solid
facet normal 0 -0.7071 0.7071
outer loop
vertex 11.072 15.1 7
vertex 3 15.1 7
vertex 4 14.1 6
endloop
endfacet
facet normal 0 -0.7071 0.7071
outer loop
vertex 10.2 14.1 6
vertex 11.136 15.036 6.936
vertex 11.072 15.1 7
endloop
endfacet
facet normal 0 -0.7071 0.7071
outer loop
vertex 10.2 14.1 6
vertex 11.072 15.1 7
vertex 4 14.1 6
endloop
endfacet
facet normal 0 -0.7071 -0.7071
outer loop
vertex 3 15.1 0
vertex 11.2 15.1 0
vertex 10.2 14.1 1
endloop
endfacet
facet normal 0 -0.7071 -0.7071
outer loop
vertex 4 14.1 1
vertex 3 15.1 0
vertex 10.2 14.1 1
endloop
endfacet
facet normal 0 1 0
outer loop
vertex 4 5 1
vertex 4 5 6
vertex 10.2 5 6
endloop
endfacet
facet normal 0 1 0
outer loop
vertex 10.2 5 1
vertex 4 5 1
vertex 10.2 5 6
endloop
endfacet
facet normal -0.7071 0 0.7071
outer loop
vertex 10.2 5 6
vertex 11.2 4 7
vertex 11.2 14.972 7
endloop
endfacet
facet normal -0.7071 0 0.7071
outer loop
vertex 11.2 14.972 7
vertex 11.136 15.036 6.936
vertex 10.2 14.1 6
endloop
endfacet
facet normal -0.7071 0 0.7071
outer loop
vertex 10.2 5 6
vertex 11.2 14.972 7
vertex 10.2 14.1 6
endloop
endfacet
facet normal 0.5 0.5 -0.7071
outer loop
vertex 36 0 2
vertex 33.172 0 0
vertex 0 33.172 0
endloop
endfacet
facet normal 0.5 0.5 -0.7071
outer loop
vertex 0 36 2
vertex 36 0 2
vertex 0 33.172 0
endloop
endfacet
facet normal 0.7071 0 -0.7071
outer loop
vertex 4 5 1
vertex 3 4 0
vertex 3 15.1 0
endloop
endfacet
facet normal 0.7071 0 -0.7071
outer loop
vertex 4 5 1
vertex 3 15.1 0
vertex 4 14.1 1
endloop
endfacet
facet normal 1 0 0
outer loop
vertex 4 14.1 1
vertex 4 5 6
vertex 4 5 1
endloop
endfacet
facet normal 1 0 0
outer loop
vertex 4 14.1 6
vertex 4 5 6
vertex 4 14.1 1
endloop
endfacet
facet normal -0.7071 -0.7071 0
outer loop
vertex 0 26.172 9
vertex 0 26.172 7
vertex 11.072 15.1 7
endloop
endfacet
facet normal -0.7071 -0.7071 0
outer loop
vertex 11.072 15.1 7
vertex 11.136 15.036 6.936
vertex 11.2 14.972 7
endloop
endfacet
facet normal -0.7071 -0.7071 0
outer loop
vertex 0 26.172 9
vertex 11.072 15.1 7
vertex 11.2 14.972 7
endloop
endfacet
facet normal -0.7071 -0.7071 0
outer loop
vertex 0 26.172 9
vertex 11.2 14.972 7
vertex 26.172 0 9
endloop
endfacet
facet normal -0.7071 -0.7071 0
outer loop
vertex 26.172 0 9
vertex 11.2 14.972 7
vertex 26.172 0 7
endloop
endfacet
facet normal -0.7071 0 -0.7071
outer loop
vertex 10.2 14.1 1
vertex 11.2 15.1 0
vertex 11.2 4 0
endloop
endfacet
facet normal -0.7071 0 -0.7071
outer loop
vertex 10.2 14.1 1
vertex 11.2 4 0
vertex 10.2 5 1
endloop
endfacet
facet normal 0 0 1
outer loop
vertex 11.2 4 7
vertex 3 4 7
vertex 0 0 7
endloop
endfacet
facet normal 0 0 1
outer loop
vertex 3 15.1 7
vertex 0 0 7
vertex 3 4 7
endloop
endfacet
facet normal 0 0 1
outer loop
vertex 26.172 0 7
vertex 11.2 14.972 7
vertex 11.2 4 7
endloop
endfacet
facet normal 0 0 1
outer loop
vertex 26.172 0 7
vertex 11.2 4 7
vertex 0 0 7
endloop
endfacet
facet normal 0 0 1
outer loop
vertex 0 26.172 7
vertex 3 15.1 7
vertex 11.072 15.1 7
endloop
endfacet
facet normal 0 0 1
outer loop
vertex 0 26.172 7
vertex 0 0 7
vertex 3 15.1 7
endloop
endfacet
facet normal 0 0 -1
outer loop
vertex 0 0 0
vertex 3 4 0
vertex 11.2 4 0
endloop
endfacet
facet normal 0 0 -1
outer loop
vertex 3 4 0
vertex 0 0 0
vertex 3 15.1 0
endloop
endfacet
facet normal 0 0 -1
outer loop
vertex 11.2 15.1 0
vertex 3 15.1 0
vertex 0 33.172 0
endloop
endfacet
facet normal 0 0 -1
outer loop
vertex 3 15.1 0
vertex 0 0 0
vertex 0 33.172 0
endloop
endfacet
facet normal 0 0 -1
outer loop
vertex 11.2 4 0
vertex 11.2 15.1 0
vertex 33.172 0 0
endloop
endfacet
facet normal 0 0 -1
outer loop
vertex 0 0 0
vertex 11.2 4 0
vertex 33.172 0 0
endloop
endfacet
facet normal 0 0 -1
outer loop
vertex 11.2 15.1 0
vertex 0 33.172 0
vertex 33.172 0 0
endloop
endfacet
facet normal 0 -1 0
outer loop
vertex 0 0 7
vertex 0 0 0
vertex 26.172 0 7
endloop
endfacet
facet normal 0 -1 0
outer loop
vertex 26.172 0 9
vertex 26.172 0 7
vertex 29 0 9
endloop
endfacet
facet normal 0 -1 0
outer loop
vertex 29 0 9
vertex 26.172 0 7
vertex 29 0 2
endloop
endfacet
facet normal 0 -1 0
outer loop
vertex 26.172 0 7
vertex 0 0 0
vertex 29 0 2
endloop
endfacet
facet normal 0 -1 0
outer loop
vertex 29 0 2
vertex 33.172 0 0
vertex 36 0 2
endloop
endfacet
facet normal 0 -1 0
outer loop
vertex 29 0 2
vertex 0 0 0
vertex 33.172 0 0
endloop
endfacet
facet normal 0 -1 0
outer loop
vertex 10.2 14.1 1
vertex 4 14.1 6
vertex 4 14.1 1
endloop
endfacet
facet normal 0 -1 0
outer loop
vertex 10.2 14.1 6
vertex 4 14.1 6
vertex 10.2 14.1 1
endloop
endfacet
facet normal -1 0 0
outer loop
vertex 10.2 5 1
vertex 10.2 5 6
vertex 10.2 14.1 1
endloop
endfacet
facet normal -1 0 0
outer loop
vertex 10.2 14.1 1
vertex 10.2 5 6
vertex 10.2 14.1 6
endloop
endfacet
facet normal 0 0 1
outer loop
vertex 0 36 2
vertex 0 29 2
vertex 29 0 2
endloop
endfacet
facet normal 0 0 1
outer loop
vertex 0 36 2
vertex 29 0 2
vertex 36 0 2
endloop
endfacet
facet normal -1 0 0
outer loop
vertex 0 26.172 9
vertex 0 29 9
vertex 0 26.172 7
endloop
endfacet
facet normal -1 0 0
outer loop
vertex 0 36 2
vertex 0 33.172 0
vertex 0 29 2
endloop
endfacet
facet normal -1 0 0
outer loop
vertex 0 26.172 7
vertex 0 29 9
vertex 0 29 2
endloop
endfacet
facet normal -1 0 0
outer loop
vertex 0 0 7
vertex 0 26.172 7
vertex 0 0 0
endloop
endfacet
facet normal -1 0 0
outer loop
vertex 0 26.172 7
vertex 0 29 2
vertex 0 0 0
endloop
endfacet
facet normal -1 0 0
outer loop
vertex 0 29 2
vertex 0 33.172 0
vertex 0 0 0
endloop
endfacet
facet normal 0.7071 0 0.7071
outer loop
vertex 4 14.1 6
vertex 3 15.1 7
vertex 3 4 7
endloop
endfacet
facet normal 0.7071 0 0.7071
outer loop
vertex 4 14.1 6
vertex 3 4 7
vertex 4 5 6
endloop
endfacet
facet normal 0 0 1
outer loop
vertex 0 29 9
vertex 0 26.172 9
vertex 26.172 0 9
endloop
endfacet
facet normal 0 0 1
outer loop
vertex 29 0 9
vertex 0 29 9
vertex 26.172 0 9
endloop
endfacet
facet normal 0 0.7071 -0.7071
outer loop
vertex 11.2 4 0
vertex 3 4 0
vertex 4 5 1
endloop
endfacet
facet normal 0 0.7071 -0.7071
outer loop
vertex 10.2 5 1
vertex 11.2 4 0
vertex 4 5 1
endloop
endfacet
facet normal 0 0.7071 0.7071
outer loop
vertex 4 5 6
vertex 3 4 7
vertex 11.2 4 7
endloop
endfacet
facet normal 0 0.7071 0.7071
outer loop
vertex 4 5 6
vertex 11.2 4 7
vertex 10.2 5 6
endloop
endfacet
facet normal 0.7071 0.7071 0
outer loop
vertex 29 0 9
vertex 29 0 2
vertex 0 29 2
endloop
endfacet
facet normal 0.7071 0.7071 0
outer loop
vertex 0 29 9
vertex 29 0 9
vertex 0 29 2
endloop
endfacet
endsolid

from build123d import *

# Parameters (mm, degrees)
F1_DEPTH     = 2
F3_DEPTH     = 5
F5_DEPTH     = 2
F6_W         = 6.2
F6_H         = 9.1
F7_DEPTH     = 7.001
F8_T1_DEPTH  = 9.1
F8_T3_DEPTH  = 6.2
F8_T9_DEPTH  = 8.771682988
F8_T13_DEPTH = 11.671682988
F8_T20_DEPTH = 11.671682988
F8_T24_DEPTH = 8.771682988
F8_T31_DEPTH = 8.771682988
F8_T36_DEPTH = 11.671682988
F8_T44_DEPTH = 8.771682988
F8_T48_DEPTH = 11.671682988
F8_T55_DEPTH = 8.771682988
F8_T59_DEPTH = 11.671682988
F8_T66_DEPTH = 8.771682988
F8_T70_DEPTH = 11.671682988
F8_T77_DEPTH = 8.771682988
F8_T81_DEPTH = 11.671682988
F8_T88_DEPTH = 11.671682988
F8_T92_DEPTH = 8.771682988
F9_SIZE      = 1.99999


# Not quite as in the source:
# - a fillet or chamfer that OpenCascade refuses, or shapes differently, is made with other operations: its cross-section is extruded or revolved along the edge and cut away or added
# - a fillet or chamfer is up to 0.001 mm smaller than in the source, because OpenCascade refuses the exact size


with BuildPart() as f1:
    # F0 (on Top) → F1 (new body)
    with BuildSketch(Plane.XY):
        Polygon((0, 36), (0, 0), (36, 0), align=None)
    extrude(amount=F1_DEPTH)

    # F2 (on face) → F3 (join)
    with BuildSketch(Plane.XY.offset(2)):
        Polygon((0, 29), (0, 0), (29, 0), align=None)
    extrude(amount=F3_DEPTH)

    # F4 (on face) → F5 (join)
    with BuildSketch(Plane.XY.offset(7)):
        Polygon((29, 0), (0, 29), (0, 26.1715728753), (26.1715728753, 0), align=None)
    extrude(amount=F5_DEPTH)

    # F6 (on face) → F7 (cut, through all)
    with BuildSketch(Plane.XY.offset(7)):
        with Locations((7.1, 9.55)):
            Rectangle(F6_W, F6_H)
    extrude(amount=-F7_DEPTH, mode=Mode.SUBTRACT)

    # F8: chamfer of 1 on 8 edges, made by hand

    # F8_s2 → F8_t1 (cut)
    with BuildSketch(Plane.XZ.offset(-14.1)):
        Polygon((3, 7), (4, 6), (4, 7), align=None)
        Polygon((11.2, 7), (10.2, 6), (10.2, 7), align=None)
        Polygon((11.2, 0), (10.2, 1), (10.2, 0), align=None)
        Polygon((3, 0), (4, 1), (4, 0), align=None)
    extrude(amount=F8_T1_DEPTH, mode=Mode.SUBTRACT)

    # F8_s4 → F8_t3 (cut)
    with BuildSketch(Plane.YZ.offset(4)):
        Polygon((15.1, 7), (14.1, 6), (14.1, 7), align=None)
        Polygon((4, 7), (5, 6), (5, 7), align=None)
        Polygon((15.1, 0), (14.1, 1), (14.1, 0), align=None)
        Polygon((4, 0), (5, 1), (5, 0), align=None)
    extrude(amount=F8_T3_DEPTH, mode=Mode.SUBTRACT)


with BuildPart() as f8_tool7:
    # F8_s8 → F8_t9 (new body)
    with BuildSketch(Plane.YZ.offset(10.2)):
        Polygon((15.1, 7), (14.1, 6), (14.1, 7), align=None)
    extrude(amount=-F8_T9_DEPTH)

    split(bisect_by=Plane.YZ.offset(4), keep=Keep.BOTTOM)


with BuildPart() as f8_tool11:
    # F8_s12 → F8_t13 (new body)
    with BuildSketch(Plane.XZ.offset(-16.671682988)):
        Polygon((3, 7), (4, 6), (4, 7), align=None)
    extrude(amount=F8_T13_DEPTH)

    split(bisect_by=Plane.XZ.offset(-14.1), keep=Keep.BOTTOM)


with BuildPart() as f8_tool7_1:
    add(f8_tool7.part)

    # F8_t15: intersect F8_tool11
    add(f8_tool11.part, mode=Mode.INTERSECT)


with BuildPart() as f1_1:
    add(f1.part)

    # F8_t5: cut F8_tool7
    add(f8_tool7_1.part, mode=Mode.SUBTRACT)


with BuildPart() as f8_tool18:
    # F8_s19 → F8_t20 (new body)
    with BuildSketch(Plane.XZ.offset(-14.1)):
        Polygon((3, 7), (4, 6), (4, 7), align=None)
    extrude(amount=F8_T20_DEPTH)

    split(bisect_by=Plane.XZ.offset(-5), keep=Keep.TOP)


with BuildPart() as f8_tool22:
    # F8_s23 → F8_t24 (new body)
    with BuildSketch(Plane.YZ.offset(1.428317012)):
        Polygon((4, 7), (5, 6), (5, 7), align=None)
    extrude(amount=F8_T24_DEPTH)

    split(bisect_by=Plane.YZ.offset(4), keep=Keep.BOTTOM)


with BuildPart() as f8_tool18_1:
    add(f8_tool18.part)

    # F8_t26: intersect F8_tool22
    add(f8_tool22.part, mode=Mode.INTERSECT)


with BuildPart() as f1_2:
    add(f1_1.part)

    # F8_t16: cut F8_tool18
    add(f8_tool18_1.part, mode=Mode.SUBTRACT)


with BuildPart() as f8_tool29:
    # F8_s30 → F8_t31 (new body)
    with BuildSketch(Plane.YZ.offset(12.771682988)):
        Polygon((15.1, 7), (14.1, 6), (14.1, 7), align=None)
    extrude(amount=-F8_T31_DEPTH)

    split(bisect_by=Plane(origin=(13.0857864376, 13.0857864376, 0), x_dir=(0, 0, 1), z_dir=(-0.7071067812, -0.7071067812, 0)), keep=Keep.TOP)

    split(bisect_by=Plane.YZ.offset(10.2), keep=Keep.TOP)


with BuildPart() as f8_tool34:
    # F8_s35 → F8_t36 (new body)
    with BuildSketch(Plane.XZ.offset(-5)):
        Polygon((11.2, 7), (10.2, 6), (10.2, 7), align=None)
    extrude(amount=-F8_T36_DEPTH)

    split(bisect_by=Plane(origin=(13.0857864376, 13.0857864376, 0), x_dir=(0, 0, 1), z_dir=(-0.7071067812, -0.7071067812, 0)), keep=Keep.TOP)

    split(bisect_by=Plane.XZ.offset(-14.1), keep=Keep.BOTTOM)


with BuildPart() as f8_tool29_1:
    add(f8_tool29.part)

    # F8_t39: intersect F8_tool34
    add(f8_tool34.part, mode=Mode.INTERSECT)


with BuildPart() as f1_3:
    add(f1_2.part)

    # F8_t27: cut F8_tool29
    add(f8_tool29_1.part, mode=Mode.SUBTRACT)


with BuildPart() as f8_tool42:
    # F8_s43 → F8_t44 (new body)
    with BuildSketch(Plane.YZ.offset(4)):
        Polygon((4, 7), (5, 6), (5, 7), align=None)
    extrude(amount=F8_T44_DEPTH)

    split(bisect_by=Plane.YZ.offset(10.2), keep=Keep.TOP)


with BuildPart() as f8_tool46:
    # F8_s47 → F8_t48 (new body)
    with BuildSketch(Plane.XZ.offset(-2.428317012)):
        Polygon((11.2, 7), (10.2, 6), (10.2, 7), align=None)
    extrude(amount=-F8_T48_DEPTH)

    split(bisect_by=Plane.XZ.offset(-5), keep=Keep.TOP)


with BuildPart() as f8_tool42_1:
    add(f8_tool42.part)

    # F8_t50: intersect F8_tool46
    add(f8_tool46.part, mode=Mode.INTERSECT)


with BuildPart() as f1_4:
    add(f1_3.part)

    # F8_t40: cut F8_tool42
    add(f8_tool42_1.part, mode=Mode.SUBTRACT)


with BuildPart() as f8_tool53:
    # F8_s54 → F8_t55 (new body)
    with BuildSketch(Plane.YZ.offset(12.771682988)):
        Polygon((15.1, 0), (14.1, 1), (14.1, 0), align=None)
    extrude(amount=-F8_T55_DEPTH)

    split(bisect_by=Plane.YZ.offset(10.2), keep=Keep.TOP)


with BuildPart() as f8_tool57:
    # F8_s58 → F8_t59 (new body)
    with BuildSketch(Plane.XZ.offset(-5)):
        Polygon((11.2, 0), (10.2, 1), (10.2, 0), align=None)
    extrude(amount=-F8_T59_DEPTH)

    split(bisect_by=Plane.XZ.offset(-14.1), keep=Keep.BOTTOM)


with BuildPart() as f8_tool53_1:
    add(f8_tool53.part)

    # F8_t61: intersect F8_tool57
    add(f8_tool57.part, mode=Mode.INTERSECT)


with BuildPart() as f1_5:
    add(f1_4.part)

    # F8_t51: cut F8_tool53
    add(f8_tool53_1.part, mode=Mode.SUBTRACT)


with BuildPart() as f8_tool64:
    # F8_s65 → F8_t66 (new body)
    with BuildSketch(Plane.YZ.offset(10.2)):
        Polygon((15.1, 0), (14.1, 1), (14.1, 0), align=None)
    extrude(amount=-F8_T66_DEPTH)

    split(bisect_by=Plane.YZ.offset(4), keep=Keep.BOTTOM)


with BuildPart() as f8_tool68:
    # F8_s69 → F8_t70 (new body)
    with BuildSketch(Plane.XZ.offset(-16.671682988)):
        Polygon((3, 0), (4, 1), (4, 0), align=None)
    extrude(amount=F8_T70_DEPTH)

    split(bisect_by=Plane.XZ.offset(-14.1), keep=Keep.BOTTOM)


with BuildPart() as f8_tool64_1:
    add(f8_tool64.part)

    # F8_t72: intersect F8_tool68
    add(f8_tool68.part, mode=Mode.INTERSECT)


with BuildPart() as f1_6:
    add(f1_5.part)

    # F8_t62: cut F8_tool64
    add(f8_tool64_1.part, mode=Mode.SUBTRACT)


with BuildPart() as f8_tool75:
    # F8_s76 → F8_t77 (new body)
    with BuildSketch(Plane.YZ.offset(4)):
        Polygon((4, 0), (5, 1), (5, 0), align=None)
    extrude(amount=F8_T77_DEPTH)

    split(bisect_by=Plane.YZ.offset(10.2), keep=Keep.TOP)


with BuildPart() as f8_tool79:
    # F8_s80 → F8_t81 (new body)
    with BuildSketch(Plane.XZ.offset(-2.428317012)):
        Polygon((11.2, 0), (10.2, 1), (10.2, 0), align=None)
    extrude(amount=-F8_T81_DEPTH)

    split(bisect_by=Plane.XZ.offset(-5), keep=Keep.TOP)


with BuildPart() as f8_tool75_1:
    add(f8_tool75.part)

    # F8_t83: intersect F8_tool79
    add(f8_tool79.part, mode=Mode.INTERSECT)


with BuildPart() as f1_7:
    add(f1_6.part)

    # F8_t73: cut F8_tool75
    add(f8_tool75_1.part, mode=Mode.SUBTRACT)


with BuildPart() as f8_tool86:
    # F8_s87 → F8_t88 (new body)
    with BuildSketch(Plane.XZ.offset(-14.1)):
        Polygon((3, 0), (4, 1), (4, 0), align=None)
    extrude(amount=F8_T88_DEPTH)

    split(bisect_by=Plane.XZ.offset(-5), keep=Keep.TOP)


with BuildPart() as f8_tool90:
    # F8_s91 → F8_t92 (new body)
    with BuildSketch(Plane.YZ.offset(1.428317012)):
        Polygon((4, 0), (5, 1), (5, 0), align=None)
    extrude(amount=F8_T92_DEPTH)

    split(bisect_by=Plane.YZ.offset(4), keep=Keep.BOTTOM)


with BuildPart() as f8_tool86_1:
    add(f8_tool86.part)

    # F8_t94: intersect F8_tool90
    add(f8_tool90.part, mode=Mode.INTERSECT)


with BuildPart() as f1_8:
    add(f1_7.part)

    # F8_t84: cut F8_tool86
    add(f8_tool86_1.part, mode=Mode.SUBTRACT)

    # F9 (size 2 in the source; OpenCascade refuses exactly that, so slightly less here)
    f9_edges = [f1_8.edges().sort_by_distance(p)[0] for p in [
        (18, 18, 0),
    ]]
    chamfer(f9_edges, length=F9_SIZE)


solid = f1_8.part
